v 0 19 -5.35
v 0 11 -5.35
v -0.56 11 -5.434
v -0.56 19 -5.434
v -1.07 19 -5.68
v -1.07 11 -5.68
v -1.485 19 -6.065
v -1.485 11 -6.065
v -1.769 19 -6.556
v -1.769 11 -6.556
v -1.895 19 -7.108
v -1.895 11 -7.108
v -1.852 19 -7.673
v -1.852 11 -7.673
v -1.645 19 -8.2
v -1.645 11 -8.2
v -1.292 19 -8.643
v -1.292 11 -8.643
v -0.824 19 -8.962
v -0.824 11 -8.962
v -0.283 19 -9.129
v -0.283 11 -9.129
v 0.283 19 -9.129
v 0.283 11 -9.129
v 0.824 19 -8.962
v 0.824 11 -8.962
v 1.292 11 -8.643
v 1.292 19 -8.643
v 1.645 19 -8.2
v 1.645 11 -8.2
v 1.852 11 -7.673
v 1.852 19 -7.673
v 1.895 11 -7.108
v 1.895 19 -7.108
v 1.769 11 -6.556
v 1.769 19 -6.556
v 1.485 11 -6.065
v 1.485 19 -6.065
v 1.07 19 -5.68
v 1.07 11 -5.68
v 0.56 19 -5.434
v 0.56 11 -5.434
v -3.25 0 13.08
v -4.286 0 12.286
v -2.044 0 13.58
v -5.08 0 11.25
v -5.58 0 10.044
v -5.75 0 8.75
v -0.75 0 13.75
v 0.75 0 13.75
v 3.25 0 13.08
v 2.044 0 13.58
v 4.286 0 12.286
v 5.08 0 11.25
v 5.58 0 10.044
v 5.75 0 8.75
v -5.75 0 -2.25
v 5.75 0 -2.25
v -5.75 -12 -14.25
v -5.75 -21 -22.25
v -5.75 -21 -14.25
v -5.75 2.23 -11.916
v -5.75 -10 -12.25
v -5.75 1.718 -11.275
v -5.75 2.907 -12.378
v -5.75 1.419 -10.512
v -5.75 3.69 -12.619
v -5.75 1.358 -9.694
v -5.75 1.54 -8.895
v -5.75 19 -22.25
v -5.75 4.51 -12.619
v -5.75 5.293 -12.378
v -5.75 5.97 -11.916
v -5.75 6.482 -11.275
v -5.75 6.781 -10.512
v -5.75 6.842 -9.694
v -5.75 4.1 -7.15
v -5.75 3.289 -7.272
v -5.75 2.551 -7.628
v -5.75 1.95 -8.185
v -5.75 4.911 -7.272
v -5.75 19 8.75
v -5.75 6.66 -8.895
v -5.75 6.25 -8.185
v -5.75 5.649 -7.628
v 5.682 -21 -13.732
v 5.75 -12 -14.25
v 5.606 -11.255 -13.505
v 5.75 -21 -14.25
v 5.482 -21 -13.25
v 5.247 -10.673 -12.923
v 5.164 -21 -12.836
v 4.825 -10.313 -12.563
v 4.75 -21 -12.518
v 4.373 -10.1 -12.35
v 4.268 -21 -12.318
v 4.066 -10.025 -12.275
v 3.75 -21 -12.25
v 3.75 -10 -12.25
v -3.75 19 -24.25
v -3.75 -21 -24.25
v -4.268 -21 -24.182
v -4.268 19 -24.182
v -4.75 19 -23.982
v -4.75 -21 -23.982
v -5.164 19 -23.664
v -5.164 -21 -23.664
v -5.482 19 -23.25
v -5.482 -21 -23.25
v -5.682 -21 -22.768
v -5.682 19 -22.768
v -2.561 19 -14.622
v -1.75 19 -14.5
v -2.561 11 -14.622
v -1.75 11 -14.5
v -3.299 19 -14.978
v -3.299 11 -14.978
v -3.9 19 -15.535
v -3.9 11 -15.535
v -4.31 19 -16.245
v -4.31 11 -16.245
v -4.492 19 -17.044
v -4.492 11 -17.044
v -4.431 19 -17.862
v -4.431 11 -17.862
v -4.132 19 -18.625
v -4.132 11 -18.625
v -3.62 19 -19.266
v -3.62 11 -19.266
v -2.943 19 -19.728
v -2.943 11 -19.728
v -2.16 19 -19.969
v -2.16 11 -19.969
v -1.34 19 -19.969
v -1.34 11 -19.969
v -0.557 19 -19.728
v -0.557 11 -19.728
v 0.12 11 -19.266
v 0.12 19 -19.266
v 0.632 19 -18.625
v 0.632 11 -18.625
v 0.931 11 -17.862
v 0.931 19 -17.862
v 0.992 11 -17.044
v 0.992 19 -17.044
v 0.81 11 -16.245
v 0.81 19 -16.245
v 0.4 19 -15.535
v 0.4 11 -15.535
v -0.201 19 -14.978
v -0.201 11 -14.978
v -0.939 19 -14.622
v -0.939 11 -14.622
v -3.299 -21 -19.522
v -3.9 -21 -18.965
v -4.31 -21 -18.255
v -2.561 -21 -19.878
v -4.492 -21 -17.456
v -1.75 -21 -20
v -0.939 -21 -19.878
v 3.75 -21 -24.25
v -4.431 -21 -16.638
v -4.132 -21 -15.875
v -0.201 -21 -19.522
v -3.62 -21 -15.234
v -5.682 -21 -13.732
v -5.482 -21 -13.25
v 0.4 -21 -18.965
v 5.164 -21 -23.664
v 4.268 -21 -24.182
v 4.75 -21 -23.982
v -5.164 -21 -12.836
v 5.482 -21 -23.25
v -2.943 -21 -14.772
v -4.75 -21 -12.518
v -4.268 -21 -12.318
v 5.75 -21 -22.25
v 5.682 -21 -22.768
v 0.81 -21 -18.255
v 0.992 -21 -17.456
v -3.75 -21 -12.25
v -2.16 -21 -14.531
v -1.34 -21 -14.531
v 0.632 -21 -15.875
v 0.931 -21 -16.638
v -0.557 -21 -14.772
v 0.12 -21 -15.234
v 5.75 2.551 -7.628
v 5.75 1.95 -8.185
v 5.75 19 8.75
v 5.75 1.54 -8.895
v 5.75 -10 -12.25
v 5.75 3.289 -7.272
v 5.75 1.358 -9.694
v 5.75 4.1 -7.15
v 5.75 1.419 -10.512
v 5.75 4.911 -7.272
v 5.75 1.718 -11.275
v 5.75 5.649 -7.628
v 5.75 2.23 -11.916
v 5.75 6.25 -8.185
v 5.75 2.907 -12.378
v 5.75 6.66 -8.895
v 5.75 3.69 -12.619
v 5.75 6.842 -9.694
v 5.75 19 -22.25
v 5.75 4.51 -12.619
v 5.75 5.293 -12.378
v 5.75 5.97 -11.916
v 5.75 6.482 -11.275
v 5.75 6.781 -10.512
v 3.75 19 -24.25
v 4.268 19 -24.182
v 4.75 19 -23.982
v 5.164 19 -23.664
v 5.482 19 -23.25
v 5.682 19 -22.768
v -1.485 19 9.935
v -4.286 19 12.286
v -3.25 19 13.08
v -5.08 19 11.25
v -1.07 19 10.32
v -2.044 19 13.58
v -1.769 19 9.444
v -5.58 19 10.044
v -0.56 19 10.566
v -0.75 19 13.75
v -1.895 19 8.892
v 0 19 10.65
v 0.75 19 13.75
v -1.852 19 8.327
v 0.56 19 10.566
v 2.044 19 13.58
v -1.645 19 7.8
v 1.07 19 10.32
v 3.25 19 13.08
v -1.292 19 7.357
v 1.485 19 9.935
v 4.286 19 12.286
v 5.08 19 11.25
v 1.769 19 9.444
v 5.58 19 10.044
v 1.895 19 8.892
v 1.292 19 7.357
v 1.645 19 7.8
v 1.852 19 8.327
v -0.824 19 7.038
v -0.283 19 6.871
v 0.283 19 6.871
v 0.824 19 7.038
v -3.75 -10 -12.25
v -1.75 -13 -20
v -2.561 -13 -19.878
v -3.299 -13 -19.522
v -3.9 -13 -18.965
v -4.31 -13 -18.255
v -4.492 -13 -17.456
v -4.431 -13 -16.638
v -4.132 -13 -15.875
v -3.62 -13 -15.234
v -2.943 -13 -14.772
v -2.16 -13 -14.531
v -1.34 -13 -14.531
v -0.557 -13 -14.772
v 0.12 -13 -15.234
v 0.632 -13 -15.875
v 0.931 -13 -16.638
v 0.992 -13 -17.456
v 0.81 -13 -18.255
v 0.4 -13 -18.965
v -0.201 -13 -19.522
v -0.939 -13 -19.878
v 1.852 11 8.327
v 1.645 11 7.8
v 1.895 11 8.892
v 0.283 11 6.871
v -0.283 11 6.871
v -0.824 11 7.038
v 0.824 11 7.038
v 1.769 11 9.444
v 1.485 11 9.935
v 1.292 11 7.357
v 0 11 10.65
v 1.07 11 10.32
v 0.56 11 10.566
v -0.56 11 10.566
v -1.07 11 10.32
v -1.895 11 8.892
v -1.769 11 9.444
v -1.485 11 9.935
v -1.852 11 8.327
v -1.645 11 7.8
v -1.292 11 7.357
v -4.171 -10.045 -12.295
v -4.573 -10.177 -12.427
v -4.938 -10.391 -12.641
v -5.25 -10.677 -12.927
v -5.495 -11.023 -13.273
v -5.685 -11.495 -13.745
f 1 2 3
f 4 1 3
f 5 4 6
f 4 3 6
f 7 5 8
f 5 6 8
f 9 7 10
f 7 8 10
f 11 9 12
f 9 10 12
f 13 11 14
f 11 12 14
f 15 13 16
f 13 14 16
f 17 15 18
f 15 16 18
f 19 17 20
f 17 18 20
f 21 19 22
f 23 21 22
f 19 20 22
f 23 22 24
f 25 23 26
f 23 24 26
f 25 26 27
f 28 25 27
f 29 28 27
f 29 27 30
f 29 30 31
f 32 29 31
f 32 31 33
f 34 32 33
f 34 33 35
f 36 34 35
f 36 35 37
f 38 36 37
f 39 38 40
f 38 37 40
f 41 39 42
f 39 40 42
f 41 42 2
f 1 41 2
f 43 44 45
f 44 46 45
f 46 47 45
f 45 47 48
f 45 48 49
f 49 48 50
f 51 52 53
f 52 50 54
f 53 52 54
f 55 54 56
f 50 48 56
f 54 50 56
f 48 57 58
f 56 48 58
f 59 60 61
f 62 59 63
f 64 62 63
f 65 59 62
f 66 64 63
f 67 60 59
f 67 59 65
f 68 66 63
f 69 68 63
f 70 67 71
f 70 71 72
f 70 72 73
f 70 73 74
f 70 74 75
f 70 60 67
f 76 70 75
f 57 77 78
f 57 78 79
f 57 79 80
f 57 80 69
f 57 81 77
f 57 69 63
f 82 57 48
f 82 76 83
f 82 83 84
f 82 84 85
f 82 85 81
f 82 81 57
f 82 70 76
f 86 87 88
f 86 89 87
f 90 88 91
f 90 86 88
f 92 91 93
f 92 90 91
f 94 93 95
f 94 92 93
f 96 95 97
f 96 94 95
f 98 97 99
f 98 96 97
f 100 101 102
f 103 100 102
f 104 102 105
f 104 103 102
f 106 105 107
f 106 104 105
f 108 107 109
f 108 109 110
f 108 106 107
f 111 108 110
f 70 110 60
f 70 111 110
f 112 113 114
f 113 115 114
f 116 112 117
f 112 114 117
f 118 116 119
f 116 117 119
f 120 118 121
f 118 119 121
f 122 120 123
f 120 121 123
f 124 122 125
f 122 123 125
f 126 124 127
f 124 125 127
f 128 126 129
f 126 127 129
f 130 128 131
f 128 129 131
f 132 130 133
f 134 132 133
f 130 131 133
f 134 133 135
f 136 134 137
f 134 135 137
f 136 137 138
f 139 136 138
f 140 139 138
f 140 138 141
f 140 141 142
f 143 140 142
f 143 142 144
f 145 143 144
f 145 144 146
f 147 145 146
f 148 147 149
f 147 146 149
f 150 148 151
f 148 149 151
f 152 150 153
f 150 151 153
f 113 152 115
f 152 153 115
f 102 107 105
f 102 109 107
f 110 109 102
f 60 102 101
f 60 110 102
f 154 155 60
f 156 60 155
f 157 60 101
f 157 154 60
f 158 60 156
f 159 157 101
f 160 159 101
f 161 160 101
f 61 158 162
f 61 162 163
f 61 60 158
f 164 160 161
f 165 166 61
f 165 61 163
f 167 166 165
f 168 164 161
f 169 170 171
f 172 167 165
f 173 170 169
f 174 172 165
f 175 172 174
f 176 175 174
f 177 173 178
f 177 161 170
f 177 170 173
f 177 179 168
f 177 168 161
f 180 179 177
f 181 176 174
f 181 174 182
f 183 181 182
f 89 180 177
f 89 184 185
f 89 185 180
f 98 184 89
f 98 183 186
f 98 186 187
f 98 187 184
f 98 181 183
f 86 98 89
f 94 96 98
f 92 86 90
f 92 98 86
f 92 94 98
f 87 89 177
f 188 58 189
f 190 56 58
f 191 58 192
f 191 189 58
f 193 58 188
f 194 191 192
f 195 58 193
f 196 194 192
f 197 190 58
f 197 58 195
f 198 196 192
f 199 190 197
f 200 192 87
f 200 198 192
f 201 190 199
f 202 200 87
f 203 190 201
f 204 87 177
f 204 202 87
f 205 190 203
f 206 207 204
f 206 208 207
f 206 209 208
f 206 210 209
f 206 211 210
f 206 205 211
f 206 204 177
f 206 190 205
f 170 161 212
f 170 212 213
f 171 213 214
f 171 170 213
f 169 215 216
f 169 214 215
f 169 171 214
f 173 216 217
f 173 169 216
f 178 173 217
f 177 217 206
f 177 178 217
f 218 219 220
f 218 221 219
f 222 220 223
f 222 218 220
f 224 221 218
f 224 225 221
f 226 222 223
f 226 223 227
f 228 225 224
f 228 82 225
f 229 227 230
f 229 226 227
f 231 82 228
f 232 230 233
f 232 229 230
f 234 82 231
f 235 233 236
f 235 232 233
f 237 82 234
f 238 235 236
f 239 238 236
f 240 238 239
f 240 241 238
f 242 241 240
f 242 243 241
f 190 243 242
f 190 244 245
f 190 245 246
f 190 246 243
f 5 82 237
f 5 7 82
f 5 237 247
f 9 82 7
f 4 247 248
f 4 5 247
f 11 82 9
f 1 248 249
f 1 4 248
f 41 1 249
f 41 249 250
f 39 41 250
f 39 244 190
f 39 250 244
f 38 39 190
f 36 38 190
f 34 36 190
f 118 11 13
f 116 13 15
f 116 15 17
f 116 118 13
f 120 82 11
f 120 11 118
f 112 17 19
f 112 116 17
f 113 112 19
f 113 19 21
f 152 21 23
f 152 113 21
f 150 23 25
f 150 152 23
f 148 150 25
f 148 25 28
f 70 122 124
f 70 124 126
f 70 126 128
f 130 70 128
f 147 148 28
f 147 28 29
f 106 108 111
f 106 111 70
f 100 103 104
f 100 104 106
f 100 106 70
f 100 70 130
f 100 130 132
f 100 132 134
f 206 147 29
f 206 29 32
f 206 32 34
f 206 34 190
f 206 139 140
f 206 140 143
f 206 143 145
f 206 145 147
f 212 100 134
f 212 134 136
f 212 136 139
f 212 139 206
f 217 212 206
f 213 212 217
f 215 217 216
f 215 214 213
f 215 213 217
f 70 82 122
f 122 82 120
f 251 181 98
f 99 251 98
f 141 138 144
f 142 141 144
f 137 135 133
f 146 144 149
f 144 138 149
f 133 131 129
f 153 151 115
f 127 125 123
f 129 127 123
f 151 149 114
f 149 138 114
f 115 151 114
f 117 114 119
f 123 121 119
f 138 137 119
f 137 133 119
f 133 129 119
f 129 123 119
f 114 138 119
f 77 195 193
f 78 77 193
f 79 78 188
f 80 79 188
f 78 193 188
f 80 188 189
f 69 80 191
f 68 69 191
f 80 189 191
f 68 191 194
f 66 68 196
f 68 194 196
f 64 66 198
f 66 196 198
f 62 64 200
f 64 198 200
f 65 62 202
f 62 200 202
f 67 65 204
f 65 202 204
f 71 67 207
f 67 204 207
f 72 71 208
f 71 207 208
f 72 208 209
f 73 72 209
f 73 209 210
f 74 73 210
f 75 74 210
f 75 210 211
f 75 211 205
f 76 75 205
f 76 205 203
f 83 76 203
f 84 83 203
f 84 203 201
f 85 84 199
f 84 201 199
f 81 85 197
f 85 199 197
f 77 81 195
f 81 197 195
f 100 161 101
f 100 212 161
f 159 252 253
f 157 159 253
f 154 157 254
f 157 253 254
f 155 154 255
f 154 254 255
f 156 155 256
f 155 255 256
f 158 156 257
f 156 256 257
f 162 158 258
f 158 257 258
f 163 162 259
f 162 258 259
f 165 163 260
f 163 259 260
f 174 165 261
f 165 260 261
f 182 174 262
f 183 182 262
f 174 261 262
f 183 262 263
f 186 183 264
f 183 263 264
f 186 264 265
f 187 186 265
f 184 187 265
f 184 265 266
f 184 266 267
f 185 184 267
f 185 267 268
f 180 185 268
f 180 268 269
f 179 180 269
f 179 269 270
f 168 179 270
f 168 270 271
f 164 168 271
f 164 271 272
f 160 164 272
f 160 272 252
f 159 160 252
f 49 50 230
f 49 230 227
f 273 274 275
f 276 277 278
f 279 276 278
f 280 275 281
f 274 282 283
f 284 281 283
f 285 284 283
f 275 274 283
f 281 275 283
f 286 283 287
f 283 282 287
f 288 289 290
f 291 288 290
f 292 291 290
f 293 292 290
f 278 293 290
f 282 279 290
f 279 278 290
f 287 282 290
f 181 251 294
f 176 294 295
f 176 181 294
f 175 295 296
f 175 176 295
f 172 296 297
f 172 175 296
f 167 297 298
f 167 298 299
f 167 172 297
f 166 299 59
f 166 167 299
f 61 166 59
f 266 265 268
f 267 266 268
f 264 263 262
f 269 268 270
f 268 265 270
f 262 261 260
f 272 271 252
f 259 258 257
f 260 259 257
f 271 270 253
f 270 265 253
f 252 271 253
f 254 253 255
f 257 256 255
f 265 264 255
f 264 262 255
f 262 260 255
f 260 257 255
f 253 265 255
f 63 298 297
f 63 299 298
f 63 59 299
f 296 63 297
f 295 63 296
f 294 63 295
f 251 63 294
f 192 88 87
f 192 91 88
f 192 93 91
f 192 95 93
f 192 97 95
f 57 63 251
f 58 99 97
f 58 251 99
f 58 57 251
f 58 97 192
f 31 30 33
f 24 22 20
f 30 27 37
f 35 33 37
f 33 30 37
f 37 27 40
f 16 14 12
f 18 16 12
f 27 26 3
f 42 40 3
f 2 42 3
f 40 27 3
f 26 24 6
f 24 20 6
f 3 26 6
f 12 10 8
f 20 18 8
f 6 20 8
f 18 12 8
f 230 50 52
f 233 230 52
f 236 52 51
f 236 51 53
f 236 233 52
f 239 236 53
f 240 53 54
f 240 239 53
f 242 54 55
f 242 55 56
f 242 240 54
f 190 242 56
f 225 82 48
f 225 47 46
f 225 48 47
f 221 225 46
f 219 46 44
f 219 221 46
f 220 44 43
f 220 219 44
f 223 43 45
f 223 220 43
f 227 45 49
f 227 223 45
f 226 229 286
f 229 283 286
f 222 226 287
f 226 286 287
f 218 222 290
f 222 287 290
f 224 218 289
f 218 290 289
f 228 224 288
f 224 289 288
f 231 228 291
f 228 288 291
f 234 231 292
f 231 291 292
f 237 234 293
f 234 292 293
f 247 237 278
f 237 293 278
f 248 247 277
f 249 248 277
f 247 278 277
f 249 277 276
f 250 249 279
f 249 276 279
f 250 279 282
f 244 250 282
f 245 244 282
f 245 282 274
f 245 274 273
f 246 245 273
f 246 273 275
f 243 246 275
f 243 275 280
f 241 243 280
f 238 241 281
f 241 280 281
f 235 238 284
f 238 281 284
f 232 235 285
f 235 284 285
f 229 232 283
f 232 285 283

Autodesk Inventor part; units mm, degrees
ref_plane "YZ Plane" through (0, 0, 0) normal (1, 0, 0) x (0, 1, 0)
ref_plane "XZ Plane" through (0, 0, 0) normal (0, 1, 0) x (-1, 0, 0)
ref_plane "XY Plane" through (0, 0, 0) normal (0, 0, 1) x (1, 0, 0)
sketch "Sketch1" plane through (0, 0, 0) normal (0, 1, 0) x (-1, 0, 0)
  line L0 (-5.75, 13.75) -> (5.75, 13.75)
  line L1 (5.75, 13.75) -> (5.75, -13.75)
  line L2 (5.75, -13.75) -> (-5.75, -13.75)
  line L3 (-5.75, -13.75) -> (-5.75, 13.75)
  line L4 (-5.75, 13.75) -> (5.75, -13.75) construction
  line L5 (5.75, 13.75) -> (-5.75, -13.75) construction
  line L6 (0, 8) -> (0, -8) construction
  point P0 (0, 0)
  point P1 (0, 0)
  dimension "d0" = 16
  dimension "d18" = 27.5
  dimension "d19" = 11.5
extrude "Extrusion1" add sketch "Sketch1" along normal blind 19
fillet "Fillet1" radius 5 2 edges at (5.75, 9.5, 13.75) (-5.75, 9.5, 13.75)
sketch "Sketch3" plane through (0, 19, 0) normal (0, 1, 0) x (1, 0, 0)
  line L0 (0, 7.25) -> (0, -8.75) construction
  line L1 (-5.75, 13.75) -> (-5.75, -8.75) construction
  line L2 (-0.75, -13.75) -> (0.75, -13.75) projected
  point P0 (0, 0)
  dimension "d7" = 16
  dimension "d8" = 5.75
  dimension "d9" = 5
hole "Hole1" at (0, 19, -7.25) at (0, 19, 8.75) direction (0, -1, 0) diameter 3.8 depth 8
sketch "Sketch4" plane through (-5.75, 0, -13.75) normal (-1, 0, 0) x (0, 0, 1)
  line L0 (27.5, 0) -> (27.5, 19) projected
  point P0 (13.75, 0)
  point P1 (3.85, 4.1)
  dimension "d17" = 23.65
  dimension "d20" = 4.1
hole "Hole2" at (-5.75, 4.1, -9.9) direction (1, 0, 0) diameter 5.5 end through all
sketch "Sketch5" plane through (0, 19, 0) normal (0, 1, 0) x (1, 0, 0)
  line L0 (5.75, 13.75) -> (-5.75, 13.75) construction
  line L1 (-5.75, 13.75) -> (5.75, 13.75)
  line L2 (5.75, 13.75) -> (5.75, 24.25)
  line L3 (5.75, 24.25) -> (-5.75, 24.25)
  line L4 (-5.75, 24.25) -> (-5.75, 13.75)
  line L5 (-0.75, -13.75) -> (0.75, -13.75) projected
  point P0 (0, 0)
  point P1 (0, -13.75)
  dimension "d28" = 38
extrude "Extrusion2" add sketch "Sketch5" against normal up to surface (19 mm away)
sketch "Sketch7" plane through (0, 19, 0) normal (0, 1, 0) x (1, 0, 0)
  circle A0 centre (0, 7.25) radius 1.9 construction
  circle A1 centre (0, -8.75) radius 1.9 construction
  point P0 (0, 0)
  point P1 (-1.75, 17.25)
  dimension "d31" = 1.75
  dimension "d32" = 10
hole "Hole3" at (-1.75, 19, -17.25) direction (0, -1, 0) diameter 5.5 depth 8
sketch "Sketch9" plane through (0, 0, 0) normal (0, -1, 0) x (1, 0, 0)
  line L0 (5.75, 8.75) -> (5.75, -24.25) construction
  line L1 (-5.75, -24.25) -> (-5.75, 8.75) construction
  line L2 (5.75, -24.25) -> (-5.75, -24.25)
  line L3 (-5.75, -24.25) -> (-5.75, -12.25)
  line L4 (-5.75, -12.25) -> (5.75, -12.25)
  line L5 (5.75, -12.25) -> (5.75, -24.25)
  point P0 (0, 0)
  dimension "d47" = 12
extrude "Extrusion3" add sketch "Sketch9" along normal blind 21
chamfer "Chamfer1" distance 10 angle 45 1 edges at (0, 0, -12.25)
sketch "Sketch10" plane through (0, -21, 0) normal (0, -1, 0) x (1, 0, 0)
  circle A0 centre (-1.75, -17.25) radius 2.75 construction
  point P0 (0, 0)
hole "Hole5" at (-1.75, -21, -17.25) direction (0, 1, 0) diameter 5.5 depth 8
fillet "Fillet2" radius 2 4 edges at (-5.75, -1, -24.25) (5.75, -1, -24.25) (-5.75, -15.5, -12.25) (5.75, -15.5, -12.25)
properties part number "CH_01_0040_kradex_mount_2"
